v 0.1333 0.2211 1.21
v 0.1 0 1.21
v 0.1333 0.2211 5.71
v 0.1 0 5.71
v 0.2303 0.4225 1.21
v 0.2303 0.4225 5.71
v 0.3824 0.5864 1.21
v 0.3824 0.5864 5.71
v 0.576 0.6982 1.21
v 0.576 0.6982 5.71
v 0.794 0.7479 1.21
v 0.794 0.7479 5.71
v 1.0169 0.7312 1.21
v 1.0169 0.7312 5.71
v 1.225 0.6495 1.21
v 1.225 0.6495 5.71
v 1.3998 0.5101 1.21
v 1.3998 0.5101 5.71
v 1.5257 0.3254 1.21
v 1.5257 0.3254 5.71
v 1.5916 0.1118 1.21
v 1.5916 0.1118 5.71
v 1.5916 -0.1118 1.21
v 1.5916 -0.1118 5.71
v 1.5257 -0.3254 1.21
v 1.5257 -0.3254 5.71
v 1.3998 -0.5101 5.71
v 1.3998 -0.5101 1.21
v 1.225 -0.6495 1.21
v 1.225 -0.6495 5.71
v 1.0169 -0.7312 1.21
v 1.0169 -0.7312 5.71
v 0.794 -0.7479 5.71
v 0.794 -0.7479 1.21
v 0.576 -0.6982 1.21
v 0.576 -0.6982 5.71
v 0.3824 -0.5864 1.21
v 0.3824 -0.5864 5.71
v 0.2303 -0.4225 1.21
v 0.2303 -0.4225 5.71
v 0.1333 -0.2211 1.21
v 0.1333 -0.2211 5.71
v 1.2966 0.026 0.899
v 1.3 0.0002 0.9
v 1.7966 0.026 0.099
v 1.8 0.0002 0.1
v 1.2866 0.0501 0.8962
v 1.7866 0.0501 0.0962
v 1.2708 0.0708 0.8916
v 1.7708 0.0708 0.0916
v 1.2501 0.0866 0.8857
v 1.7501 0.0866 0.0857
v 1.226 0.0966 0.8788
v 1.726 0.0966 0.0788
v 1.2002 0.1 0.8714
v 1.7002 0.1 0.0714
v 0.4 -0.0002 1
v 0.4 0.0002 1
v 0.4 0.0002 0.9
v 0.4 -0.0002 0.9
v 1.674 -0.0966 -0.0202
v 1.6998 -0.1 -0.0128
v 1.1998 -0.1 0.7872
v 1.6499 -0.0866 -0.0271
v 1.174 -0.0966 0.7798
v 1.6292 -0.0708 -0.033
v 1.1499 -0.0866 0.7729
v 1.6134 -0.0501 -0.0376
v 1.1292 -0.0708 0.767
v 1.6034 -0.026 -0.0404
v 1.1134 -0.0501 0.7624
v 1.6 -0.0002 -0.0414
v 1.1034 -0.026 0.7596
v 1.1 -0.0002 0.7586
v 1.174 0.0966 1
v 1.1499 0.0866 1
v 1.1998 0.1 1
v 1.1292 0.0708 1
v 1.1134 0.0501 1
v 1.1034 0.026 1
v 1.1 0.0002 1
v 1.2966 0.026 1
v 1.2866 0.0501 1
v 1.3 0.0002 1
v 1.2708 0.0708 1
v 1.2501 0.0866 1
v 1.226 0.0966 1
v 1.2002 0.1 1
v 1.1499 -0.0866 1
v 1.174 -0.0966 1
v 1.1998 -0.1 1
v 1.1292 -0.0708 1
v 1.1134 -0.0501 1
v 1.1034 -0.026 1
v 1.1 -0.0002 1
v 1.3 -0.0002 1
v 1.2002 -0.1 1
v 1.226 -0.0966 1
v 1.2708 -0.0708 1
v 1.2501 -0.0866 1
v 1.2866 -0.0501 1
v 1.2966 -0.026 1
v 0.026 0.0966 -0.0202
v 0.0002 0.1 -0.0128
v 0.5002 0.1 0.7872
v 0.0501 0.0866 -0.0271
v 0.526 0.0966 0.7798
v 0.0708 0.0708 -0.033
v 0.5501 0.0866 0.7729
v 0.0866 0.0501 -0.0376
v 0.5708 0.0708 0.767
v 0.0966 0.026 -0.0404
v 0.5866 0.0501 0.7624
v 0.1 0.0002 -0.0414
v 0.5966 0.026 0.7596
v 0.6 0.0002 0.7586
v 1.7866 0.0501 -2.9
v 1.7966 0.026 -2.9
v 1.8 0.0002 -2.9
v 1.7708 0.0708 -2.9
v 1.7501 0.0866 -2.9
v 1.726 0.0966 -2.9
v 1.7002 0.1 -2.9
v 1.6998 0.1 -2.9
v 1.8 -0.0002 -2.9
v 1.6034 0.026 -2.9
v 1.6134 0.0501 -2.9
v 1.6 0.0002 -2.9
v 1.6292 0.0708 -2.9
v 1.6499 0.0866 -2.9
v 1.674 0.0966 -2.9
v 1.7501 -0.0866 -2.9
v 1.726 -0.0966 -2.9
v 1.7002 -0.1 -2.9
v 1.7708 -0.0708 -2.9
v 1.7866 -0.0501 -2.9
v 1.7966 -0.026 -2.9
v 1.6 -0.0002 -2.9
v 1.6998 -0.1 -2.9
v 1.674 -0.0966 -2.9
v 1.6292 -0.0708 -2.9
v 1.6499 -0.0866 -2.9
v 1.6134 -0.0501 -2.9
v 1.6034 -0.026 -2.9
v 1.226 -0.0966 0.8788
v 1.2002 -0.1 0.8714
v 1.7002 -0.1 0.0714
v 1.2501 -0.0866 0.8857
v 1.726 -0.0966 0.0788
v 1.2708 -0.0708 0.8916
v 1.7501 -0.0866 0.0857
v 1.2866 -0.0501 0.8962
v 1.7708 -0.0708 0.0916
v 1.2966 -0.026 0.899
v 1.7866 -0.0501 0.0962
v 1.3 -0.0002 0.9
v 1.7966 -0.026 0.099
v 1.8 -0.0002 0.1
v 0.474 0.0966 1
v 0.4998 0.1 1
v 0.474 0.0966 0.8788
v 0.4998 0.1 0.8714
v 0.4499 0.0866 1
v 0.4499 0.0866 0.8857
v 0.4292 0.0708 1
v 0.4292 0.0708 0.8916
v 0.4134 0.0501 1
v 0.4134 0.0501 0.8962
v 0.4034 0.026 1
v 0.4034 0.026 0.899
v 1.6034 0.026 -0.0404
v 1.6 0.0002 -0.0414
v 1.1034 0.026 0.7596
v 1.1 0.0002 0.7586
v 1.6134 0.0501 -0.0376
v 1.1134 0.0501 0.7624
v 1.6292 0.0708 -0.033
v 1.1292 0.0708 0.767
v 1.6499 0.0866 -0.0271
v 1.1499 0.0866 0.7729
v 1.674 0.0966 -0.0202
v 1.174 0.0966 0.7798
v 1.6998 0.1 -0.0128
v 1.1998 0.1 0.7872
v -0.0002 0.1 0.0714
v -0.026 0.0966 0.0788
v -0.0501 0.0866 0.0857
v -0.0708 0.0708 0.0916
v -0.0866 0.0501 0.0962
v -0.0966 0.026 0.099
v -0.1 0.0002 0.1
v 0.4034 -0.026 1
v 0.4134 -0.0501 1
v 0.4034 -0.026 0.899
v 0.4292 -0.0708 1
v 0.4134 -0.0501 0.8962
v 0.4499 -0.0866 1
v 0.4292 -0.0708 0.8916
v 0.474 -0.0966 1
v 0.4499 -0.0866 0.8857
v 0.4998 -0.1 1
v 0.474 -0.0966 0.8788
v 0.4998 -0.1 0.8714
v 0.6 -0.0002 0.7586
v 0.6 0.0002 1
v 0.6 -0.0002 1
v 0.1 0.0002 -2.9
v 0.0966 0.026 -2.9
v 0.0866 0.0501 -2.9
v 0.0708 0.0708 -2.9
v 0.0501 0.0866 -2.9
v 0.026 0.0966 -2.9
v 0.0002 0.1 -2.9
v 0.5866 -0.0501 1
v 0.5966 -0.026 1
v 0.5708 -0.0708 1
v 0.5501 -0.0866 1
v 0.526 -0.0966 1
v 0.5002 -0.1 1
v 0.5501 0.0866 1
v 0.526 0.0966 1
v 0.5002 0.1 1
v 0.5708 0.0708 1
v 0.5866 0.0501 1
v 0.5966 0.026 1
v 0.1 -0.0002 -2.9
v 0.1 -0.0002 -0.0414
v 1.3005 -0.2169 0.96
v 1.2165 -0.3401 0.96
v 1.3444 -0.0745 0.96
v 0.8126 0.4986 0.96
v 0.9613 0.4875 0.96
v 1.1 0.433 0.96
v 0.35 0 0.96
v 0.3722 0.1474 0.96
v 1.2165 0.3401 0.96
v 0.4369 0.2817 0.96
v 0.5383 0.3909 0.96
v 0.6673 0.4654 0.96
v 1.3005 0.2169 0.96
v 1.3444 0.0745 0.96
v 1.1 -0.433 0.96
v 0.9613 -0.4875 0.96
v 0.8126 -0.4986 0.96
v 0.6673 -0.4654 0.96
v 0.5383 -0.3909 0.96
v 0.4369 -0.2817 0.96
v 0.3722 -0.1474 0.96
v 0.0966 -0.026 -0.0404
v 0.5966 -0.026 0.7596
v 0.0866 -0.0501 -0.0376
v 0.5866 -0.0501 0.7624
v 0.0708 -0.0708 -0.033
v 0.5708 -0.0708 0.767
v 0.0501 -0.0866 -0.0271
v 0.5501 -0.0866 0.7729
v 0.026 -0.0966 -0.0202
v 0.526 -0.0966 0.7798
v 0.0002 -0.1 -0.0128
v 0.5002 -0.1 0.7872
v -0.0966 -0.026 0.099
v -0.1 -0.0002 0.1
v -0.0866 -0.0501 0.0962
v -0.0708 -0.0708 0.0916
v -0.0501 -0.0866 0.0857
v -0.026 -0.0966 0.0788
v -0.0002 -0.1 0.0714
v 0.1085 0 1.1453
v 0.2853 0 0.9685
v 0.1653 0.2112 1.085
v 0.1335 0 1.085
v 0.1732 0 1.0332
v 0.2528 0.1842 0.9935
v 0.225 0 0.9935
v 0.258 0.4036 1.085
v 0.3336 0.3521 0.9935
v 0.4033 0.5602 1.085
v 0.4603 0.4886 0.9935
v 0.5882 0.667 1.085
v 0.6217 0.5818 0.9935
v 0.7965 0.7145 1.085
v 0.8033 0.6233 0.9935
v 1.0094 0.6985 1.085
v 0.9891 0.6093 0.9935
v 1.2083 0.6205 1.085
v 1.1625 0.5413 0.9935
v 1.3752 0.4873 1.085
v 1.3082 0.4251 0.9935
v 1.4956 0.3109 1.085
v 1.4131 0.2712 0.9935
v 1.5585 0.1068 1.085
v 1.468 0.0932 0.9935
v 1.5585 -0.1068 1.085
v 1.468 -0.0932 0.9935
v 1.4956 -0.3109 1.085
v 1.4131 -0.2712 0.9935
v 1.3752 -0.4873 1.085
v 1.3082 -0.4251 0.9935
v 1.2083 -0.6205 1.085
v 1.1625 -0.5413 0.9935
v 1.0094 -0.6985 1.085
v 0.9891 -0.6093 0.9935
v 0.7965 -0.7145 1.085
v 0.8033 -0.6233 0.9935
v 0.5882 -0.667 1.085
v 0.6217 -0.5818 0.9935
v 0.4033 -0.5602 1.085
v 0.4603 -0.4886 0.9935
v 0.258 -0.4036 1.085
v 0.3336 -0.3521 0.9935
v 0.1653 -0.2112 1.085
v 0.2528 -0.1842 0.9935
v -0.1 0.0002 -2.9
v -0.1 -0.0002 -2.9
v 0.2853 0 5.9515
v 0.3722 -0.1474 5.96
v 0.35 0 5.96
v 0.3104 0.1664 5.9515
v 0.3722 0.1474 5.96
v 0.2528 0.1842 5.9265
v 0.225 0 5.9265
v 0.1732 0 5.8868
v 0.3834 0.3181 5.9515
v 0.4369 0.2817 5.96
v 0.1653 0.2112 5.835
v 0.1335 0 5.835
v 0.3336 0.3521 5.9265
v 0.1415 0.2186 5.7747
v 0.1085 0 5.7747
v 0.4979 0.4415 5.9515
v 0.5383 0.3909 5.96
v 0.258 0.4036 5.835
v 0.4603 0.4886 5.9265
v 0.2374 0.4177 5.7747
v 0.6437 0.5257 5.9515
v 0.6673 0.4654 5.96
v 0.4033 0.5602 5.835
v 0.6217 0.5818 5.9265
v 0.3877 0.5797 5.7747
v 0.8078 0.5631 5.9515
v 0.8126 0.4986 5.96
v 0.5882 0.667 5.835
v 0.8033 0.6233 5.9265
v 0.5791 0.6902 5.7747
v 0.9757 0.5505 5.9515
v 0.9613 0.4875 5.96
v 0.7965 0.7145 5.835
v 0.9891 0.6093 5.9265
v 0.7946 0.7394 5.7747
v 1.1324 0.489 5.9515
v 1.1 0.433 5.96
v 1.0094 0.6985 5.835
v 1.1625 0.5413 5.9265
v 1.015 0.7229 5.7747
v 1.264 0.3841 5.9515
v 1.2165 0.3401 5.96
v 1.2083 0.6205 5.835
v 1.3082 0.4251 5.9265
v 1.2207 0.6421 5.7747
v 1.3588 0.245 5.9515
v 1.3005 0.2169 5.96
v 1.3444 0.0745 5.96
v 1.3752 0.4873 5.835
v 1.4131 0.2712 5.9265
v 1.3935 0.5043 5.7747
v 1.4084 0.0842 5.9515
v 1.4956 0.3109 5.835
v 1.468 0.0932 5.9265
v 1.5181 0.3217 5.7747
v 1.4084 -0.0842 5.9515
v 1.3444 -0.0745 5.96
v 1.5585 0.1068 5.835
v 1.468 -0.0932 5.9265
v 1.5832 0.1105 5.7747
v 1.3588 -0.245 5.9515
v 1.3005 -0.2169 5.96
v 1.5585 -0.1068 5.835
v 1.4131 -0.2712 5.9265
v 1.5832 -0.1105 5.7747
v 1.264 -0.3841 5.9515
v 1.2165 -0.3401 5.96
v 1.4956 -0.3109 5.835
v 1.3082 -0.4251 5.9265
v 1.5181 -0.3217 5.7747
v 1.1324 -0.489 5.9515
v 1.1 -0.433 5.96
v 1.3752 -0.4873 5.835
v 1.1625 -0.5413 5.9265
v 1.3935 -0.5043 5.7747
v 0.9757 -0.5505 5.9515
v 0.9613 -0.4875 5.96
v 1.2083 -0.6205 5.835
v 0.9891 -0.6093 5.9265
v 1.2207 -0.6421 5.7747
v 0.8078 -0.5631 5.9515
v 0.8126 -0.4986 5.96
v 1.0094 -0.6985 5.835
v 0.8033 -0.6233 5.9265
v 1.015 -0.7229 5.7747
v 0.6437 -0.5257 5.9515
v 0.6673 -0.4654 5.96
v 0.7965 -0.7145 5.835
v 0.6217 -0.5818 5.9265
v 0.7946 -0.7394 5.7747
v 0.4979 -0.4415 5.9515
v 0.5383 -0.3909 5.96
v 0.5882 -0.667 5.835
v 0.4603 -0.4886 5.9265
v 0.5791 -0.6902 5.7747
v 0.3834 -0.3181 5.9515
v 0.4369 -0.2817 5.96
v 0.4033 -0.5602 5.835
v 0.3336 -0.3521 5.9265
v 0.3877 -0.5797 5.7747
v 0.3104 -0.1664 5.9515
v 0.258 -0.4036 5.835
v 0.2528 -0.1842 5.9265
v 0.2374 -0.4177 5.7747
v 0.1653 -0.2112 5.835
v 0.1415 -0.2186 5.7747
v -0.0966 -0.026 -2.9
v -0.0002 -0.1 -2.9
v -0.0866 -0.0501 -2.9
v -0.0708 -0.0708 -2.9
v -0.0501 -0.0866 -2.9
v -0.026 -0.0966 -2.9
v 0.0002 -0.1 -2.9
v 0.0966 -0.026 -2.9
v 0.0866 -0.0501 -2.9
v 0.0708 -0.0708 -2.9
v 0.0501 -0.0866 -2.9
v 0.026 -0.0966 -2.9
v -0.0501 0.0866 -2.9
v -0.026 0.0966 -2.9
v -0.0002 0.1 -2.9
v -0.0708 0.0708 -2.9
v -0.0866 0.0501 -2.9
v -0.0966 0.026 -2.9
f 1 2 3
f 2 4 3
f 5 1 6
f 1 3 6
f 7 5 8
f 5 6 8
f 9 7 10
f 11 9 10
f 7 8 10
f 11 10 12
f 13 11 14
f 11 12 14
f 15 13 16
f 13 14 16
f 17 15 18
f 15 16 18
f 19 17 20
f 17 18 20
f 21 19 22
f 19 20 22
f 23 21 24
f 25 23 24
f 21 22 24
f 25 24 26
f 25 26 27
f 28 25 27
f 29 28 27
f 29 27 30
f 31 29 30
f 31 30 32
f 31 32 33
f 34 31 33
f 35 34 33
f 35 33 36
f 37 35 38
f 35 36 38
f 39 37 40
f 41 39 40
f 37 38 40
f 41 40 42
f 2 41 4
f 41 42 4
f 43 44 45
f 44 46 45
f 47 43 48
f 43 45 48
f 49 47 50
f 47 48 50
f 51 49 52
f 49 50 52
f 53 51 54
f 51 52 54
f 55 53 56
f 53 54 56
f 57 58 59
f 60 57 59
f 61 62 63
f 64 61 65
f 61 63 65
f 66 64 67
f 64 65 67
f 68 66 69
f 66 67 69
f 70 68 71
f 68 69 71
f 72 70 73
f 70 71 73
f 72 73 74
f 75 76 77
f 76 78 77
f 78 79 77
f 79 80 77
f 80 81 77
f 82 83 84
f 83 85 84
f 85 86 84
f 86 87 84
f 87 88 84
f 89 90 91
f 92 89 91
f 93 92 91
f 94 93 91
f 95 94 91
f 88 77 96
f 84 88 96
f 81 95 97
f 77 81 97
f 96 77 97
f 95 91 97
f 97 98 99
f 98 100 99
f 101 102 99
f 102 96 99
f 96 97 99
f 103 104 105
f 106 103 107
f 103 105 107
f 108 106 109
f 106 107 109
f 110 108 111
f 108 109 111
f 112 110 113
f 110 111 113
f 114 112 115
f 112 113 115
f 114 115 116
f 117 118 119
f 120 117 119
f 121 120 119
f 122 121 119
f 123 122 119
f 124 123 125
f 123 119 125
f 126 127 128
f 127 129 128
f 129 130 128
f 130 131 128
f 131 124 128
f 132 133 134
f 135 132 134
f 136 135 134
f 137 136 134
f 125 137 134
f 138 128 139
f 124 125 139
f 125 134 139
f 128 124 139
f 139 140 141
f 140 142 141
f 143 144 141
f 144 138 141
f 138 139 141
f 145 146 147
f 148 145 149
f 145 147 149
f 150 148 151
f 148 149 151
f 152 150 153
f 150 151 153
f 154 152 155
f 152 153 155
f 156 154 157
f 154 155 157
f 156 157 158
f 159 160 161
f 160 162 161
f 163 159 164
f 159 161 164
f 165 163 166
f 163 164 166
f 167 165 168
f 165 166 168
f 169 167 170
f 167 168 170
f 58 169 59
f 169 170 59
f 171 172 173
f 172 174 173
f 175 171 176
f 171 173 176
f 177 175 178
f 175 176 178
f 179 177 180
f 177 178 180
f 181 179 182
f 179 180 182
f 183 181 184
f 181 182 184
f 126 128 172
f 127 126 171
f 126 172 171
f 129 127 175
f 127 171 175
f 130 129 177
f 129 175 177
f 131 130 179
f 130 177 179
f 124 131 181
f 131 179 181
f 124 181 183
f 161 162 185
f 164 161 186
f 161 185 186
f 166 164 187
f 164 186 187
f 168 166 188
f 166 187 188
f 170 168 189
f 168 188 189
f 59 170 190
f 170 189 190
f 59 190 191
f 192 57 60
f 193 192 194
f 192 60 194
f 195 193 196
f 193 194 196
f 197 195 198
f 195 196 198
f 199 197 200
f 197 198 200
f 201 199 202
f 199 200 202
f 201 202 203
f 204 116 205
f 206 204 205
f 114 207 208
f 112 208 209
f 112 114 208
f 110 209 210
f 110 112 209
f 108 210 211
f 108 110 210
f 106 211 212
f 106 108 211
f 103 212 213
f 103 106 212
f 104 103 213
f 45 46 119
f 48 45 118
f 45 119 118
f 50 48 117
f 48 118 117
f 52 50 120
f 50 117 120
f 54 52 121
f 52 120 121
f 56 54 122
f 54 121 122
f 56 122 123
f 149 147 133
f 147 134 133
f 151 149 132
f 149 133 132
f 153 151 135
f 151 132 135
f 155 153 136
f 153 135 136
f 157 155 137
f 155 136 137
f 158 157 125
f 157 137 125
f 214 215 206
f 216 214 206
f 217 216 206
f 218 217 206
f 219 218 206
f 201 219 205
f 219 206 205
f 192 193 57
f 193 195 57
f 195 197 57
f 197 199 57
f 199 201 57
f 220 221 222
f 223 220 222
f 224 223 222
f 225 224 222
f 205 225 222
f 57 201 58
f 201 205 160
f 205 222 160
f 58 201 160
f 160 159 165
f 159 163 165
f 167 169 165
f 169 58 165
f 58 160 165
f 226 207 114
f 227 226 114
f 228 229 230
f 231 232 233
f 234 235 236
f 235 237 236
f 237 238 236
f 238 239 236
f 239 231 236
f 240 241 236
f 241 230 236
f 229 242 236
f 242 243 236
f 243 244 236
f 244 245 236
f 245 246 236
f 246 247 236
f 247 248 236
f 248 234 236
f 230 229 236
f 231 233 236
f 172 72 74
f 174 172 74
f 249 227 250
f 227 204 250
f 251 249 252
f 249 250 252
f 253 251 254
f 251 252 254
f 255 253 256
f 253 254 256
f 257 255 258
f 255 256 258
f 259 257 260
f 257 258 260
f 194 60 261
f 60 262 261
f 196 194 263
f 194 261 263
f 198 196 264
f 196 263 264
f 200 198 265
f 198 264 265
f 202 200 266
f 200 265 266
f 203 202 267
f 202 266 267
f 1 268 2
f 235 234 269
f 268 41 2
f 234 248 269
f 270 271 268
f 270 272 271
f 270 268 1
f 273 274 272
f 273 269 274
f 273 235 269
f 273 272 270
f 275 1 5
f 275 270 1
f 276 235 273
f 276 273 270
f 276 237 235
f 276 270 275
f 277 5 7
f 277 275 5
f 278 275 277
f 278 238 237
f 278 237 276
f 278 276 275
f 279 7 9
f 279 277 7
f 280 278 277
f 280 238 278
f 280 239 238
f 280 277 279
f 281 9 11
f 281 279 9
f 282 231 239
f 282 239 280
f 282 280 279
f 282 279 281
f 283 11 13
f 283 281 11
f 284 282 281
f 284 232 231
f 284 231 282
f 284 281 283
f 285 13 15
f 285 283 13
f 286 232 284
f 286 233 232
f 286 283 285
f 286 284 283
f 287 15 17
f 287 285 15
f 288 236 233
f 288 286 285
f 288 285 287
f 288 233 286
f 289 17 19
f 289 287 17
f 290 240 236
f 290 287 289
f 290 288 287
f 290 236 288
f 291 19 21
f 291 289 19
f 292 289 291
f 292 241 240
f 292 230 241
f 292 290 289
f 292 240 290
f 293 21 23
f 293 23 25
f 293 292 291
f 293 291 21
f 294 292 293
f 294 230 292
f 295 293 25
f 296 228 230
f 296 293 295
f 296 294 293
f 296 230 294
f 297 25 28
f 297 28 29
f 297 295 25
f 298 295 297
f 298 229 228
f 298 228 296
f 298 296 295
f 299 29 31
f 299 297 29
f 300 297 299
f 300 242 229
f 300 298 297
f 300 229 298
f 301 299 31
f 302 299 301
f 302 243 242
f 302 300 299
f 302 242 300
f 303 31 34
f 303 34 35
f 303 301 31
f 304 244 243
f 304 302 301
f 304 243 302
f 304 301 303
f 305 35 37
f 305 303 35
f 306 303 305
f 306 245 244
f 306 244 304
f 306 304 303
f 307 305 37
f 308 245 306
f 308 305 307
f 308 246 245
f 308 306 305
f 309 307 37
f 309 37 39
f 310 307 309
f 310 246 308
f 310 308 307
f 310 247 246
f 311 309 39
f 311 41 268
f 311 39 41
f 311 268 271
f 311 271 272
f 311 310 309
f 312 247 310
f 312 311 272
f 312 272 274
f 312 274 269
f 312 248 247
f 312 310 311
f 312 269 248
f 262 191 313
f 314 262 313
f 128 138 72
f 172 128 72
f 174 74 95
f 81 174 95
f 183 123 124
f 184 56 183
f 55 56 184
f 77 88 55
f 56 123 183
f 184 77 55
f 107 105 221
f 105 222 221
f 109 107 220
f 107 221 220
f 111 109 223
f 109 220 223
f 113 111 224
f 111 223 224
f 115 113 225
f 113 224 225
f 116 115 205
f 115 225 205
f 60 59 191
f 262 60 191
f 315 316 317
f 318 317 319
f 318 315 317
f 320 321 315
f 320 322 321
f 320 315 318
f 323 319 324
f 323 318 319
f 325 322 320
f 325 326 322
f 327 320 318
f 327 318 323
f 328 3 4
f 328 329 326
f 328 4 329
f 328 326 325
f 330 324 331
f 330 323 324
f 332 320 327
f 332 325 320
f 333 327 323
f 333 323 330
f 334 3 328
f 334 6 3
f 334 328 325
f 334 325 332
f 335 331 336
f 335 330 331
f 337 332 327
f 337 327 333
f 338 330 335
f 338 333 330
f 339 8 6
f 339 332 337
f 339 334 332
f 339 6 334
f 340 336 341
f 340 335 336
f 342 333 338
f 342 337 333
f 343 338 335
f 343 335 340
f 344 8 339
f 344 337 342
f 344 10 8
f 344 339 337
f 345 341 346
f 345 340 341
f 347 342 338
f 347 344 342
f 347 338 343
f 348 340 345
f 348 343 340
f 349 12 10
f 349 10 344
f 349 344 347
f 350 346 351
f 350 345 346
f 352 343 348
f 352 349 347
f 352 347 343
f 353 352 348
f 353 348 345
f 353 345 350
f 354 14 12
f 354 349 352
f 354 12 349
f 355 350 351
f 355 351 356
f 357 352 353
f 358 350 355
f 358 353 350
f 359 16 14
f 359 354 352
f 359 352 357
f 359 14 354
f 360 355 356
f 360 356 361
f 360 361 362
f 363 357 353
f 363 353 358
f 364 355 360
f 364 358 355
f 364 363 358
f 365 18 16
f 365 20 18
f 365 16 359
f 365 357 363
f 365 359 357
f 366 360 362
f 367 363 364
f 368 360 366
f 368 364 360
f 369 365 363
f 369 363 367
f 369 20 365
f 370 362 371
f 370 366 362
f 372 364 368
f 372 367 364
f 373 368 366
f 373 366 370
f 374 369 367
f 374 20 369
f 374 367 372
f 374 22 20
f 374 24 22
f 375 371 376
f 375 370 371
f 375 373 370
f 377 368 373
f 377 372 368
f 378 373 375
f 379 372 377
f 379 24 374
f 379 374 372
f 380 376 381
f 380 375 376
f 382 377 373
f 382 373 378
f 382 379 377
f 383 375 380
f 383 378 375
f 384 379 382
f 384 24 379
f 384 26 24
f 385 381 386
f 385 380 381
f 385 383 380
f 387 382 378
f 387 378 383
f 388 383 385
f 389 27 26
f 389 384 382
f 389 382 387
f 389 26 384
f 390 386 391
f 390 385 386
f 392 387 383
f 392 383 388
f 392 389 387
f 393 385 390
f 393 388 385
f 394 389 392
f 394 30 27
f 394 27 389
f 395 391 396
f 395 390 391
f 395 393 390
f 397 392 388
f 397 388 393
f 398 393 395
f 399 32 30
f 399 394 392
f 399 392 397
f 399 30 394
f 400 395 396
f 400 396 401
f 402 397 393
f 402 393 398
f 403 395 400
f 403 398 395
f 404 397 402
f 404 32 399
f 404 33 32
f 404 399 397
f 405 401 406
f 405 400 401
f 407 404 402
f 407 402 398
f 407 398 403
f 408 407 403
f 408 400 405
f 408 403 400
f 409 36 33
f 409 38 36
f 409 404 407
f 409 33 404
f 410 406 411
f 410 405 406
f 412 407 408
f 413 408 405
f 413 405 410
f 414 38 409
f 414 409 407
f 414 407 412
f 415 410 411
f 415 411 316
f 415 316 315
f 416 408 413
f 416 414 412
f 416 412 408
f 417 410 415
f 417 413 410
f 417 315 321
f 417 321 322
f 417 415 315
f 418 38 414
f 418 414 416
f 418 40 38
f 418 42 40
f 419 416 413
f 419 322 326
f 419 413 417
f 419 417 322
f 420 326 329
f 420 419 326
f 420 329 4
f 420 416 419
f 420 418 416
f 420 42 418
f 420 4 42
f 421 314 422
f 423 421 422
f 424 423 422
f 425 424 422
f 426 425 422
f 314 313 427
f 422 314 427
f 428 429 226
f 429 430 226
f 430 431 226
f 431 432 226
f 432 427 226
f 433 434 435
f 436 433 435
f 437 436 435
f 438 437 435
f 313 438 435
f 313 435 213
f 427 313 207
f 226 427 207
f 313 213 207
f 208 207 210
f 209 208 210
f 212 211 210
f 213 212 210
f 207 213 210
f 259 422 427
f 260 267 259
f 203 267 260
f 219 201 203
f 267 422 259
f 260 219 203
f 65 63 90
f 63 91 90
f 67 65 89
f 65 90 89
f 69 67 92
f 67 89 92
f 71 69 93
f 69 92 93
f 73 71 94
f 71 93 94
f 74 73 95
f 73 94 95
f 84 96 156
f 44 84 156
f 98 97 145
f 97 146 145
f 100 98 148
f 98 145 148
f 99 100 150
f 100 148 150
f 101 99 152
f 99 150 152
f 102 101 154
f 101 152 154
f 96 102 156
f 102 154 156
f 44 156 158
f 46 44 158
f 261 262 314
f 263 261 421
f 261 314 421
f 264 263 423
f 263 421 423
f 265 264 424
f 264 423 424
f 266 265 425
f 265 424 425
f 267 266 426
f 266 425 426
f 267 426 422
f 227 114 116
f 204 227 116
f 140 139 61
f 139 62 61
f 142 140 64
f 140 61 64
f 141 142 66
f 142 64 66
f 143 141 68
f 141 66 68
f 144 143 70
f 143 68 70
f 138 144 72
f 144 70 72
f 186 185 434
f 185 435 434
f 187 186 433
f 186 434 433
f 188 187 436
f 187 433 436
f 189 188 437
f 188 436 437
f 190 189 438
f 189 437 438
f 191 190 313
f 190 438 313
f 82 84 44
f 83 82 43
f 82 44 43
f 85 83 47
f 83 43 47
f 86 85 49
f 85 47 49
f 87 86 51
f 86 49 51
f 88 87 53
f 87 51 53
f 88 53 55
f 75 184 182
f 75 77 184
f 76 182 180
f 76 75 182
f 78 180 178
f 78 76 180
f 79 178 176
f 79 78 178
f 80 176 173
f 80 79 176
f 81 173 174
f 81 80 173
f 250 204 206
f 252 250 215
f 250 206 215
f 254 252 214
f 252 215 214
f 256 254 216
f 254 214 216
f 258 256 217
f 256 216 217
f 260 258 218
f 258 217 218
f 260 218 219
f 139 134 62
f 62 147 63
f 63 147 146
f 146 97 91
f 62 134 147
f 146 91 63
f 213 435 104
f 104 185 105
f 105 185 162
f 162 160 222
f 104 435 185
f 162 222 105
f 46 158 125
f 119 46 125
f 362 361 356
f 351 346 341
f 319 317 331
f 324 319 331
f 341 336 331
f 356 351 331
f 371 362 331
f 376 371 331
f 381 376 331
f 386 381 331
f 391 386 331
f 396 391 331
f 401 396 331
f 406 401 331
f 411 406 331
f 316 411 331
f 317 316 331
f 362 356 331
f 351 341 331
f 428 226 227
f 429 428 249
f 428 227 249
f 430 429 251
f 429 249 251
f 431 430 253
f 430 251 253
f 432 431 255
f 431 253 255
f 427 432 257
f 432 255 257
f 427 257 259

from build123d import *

# Parameters (mm, degrees)
PAD_DEPTH = 0.1
FILLET_R  = 0.0998


with BuildPart() as revolution:
    # Sketch002 → Revolution (revolve)
    with BuildSketch(Plane.XZ):
        with BuildLine():
            Line((0.35, 5.96), (0.85, 5.96))
            Line((0.85, 0.96), (0.85, 5.96))
            Line((0.85, 0.96), (0.35, 0.96))
            ThreePointArc((0.1, 1.21), (0.173223, 1.033223), (0.35, 0.96))
            Line((0.1, 1.21), (0.1, 5.71))
            ThreePointArc((0.35, 5.96), (0.173223, 5.886777), (0.1, 5.71))
        make_face()
    revolve(axis=Axis((0.85, 0, 5.96), (0, 0, -1)))


with BuildPart() as fillet_body:
    # Sketch → Pad (new body, symmetric)
    with BuildSketch(Plane.XZ):
        Polygon((0.1, -2.9), (0.1, -0.041421), (0.6, 0.758579), (0.6, 1), (0.4, 1), (0.4, 0.9), (-0.1, 0.1), (-0.1, -2.9), align=None)
        Polygon((1.1, 1), (1.3, 1), (1.3, 0.9), (1.8, 0.1), (1.8, -2.9), (1.6, -2.9), (1.6, -0.041421), (1.1, 0.758579), align=None)
    extrude(amount=PAD_DEPTH, both=True)

    # Fillet
    fillet_edges = [fillet_body.edges().sort_by_distance(p)[0] for p in [
        (0.15, -0.1, 0.5),
        (0.4, -0.1, 0.95),
        (0.6, -0.1, 0.879289),
        (0.35, -0.1, 0.358579),
        (0.1, -0.1, -1.470711),
        (-0.1, -0.1, -1.4),
        (0.1, 0.1, -1.470711),
        (0.35, 0.1, 0.358579),
        (0.6, 0.1, 0.879289),
        (1.35, -0.1, 0.358579),
        (1.1, -0.1, 0.879289),
        (1.6, -0.1, -1.470711),
        (1.8, -0.1, -1.4),
        (1.55, -0.1, 0.5),
        (1.3, -0.1, 0.95),
        (1.3, 0.1, 0.95),
        (1.55, 0.1, 0.5),
        (1.8, 0.1, -1.4),
        (1.6, 0.1, -1.470711),
        (1.35, 0.1, 0.358579),
        (1.1, 0.1, 0.879289),
        (0.4, 0.1, 0.95),
        (-0.1, 0.1, -1.4),
        (0.15, 0.1, 0.5),
    ]]
    fillet(fillet_edges, radius=FILLET_R)


solid = Compound([revolution.part, fillet_body.part])
